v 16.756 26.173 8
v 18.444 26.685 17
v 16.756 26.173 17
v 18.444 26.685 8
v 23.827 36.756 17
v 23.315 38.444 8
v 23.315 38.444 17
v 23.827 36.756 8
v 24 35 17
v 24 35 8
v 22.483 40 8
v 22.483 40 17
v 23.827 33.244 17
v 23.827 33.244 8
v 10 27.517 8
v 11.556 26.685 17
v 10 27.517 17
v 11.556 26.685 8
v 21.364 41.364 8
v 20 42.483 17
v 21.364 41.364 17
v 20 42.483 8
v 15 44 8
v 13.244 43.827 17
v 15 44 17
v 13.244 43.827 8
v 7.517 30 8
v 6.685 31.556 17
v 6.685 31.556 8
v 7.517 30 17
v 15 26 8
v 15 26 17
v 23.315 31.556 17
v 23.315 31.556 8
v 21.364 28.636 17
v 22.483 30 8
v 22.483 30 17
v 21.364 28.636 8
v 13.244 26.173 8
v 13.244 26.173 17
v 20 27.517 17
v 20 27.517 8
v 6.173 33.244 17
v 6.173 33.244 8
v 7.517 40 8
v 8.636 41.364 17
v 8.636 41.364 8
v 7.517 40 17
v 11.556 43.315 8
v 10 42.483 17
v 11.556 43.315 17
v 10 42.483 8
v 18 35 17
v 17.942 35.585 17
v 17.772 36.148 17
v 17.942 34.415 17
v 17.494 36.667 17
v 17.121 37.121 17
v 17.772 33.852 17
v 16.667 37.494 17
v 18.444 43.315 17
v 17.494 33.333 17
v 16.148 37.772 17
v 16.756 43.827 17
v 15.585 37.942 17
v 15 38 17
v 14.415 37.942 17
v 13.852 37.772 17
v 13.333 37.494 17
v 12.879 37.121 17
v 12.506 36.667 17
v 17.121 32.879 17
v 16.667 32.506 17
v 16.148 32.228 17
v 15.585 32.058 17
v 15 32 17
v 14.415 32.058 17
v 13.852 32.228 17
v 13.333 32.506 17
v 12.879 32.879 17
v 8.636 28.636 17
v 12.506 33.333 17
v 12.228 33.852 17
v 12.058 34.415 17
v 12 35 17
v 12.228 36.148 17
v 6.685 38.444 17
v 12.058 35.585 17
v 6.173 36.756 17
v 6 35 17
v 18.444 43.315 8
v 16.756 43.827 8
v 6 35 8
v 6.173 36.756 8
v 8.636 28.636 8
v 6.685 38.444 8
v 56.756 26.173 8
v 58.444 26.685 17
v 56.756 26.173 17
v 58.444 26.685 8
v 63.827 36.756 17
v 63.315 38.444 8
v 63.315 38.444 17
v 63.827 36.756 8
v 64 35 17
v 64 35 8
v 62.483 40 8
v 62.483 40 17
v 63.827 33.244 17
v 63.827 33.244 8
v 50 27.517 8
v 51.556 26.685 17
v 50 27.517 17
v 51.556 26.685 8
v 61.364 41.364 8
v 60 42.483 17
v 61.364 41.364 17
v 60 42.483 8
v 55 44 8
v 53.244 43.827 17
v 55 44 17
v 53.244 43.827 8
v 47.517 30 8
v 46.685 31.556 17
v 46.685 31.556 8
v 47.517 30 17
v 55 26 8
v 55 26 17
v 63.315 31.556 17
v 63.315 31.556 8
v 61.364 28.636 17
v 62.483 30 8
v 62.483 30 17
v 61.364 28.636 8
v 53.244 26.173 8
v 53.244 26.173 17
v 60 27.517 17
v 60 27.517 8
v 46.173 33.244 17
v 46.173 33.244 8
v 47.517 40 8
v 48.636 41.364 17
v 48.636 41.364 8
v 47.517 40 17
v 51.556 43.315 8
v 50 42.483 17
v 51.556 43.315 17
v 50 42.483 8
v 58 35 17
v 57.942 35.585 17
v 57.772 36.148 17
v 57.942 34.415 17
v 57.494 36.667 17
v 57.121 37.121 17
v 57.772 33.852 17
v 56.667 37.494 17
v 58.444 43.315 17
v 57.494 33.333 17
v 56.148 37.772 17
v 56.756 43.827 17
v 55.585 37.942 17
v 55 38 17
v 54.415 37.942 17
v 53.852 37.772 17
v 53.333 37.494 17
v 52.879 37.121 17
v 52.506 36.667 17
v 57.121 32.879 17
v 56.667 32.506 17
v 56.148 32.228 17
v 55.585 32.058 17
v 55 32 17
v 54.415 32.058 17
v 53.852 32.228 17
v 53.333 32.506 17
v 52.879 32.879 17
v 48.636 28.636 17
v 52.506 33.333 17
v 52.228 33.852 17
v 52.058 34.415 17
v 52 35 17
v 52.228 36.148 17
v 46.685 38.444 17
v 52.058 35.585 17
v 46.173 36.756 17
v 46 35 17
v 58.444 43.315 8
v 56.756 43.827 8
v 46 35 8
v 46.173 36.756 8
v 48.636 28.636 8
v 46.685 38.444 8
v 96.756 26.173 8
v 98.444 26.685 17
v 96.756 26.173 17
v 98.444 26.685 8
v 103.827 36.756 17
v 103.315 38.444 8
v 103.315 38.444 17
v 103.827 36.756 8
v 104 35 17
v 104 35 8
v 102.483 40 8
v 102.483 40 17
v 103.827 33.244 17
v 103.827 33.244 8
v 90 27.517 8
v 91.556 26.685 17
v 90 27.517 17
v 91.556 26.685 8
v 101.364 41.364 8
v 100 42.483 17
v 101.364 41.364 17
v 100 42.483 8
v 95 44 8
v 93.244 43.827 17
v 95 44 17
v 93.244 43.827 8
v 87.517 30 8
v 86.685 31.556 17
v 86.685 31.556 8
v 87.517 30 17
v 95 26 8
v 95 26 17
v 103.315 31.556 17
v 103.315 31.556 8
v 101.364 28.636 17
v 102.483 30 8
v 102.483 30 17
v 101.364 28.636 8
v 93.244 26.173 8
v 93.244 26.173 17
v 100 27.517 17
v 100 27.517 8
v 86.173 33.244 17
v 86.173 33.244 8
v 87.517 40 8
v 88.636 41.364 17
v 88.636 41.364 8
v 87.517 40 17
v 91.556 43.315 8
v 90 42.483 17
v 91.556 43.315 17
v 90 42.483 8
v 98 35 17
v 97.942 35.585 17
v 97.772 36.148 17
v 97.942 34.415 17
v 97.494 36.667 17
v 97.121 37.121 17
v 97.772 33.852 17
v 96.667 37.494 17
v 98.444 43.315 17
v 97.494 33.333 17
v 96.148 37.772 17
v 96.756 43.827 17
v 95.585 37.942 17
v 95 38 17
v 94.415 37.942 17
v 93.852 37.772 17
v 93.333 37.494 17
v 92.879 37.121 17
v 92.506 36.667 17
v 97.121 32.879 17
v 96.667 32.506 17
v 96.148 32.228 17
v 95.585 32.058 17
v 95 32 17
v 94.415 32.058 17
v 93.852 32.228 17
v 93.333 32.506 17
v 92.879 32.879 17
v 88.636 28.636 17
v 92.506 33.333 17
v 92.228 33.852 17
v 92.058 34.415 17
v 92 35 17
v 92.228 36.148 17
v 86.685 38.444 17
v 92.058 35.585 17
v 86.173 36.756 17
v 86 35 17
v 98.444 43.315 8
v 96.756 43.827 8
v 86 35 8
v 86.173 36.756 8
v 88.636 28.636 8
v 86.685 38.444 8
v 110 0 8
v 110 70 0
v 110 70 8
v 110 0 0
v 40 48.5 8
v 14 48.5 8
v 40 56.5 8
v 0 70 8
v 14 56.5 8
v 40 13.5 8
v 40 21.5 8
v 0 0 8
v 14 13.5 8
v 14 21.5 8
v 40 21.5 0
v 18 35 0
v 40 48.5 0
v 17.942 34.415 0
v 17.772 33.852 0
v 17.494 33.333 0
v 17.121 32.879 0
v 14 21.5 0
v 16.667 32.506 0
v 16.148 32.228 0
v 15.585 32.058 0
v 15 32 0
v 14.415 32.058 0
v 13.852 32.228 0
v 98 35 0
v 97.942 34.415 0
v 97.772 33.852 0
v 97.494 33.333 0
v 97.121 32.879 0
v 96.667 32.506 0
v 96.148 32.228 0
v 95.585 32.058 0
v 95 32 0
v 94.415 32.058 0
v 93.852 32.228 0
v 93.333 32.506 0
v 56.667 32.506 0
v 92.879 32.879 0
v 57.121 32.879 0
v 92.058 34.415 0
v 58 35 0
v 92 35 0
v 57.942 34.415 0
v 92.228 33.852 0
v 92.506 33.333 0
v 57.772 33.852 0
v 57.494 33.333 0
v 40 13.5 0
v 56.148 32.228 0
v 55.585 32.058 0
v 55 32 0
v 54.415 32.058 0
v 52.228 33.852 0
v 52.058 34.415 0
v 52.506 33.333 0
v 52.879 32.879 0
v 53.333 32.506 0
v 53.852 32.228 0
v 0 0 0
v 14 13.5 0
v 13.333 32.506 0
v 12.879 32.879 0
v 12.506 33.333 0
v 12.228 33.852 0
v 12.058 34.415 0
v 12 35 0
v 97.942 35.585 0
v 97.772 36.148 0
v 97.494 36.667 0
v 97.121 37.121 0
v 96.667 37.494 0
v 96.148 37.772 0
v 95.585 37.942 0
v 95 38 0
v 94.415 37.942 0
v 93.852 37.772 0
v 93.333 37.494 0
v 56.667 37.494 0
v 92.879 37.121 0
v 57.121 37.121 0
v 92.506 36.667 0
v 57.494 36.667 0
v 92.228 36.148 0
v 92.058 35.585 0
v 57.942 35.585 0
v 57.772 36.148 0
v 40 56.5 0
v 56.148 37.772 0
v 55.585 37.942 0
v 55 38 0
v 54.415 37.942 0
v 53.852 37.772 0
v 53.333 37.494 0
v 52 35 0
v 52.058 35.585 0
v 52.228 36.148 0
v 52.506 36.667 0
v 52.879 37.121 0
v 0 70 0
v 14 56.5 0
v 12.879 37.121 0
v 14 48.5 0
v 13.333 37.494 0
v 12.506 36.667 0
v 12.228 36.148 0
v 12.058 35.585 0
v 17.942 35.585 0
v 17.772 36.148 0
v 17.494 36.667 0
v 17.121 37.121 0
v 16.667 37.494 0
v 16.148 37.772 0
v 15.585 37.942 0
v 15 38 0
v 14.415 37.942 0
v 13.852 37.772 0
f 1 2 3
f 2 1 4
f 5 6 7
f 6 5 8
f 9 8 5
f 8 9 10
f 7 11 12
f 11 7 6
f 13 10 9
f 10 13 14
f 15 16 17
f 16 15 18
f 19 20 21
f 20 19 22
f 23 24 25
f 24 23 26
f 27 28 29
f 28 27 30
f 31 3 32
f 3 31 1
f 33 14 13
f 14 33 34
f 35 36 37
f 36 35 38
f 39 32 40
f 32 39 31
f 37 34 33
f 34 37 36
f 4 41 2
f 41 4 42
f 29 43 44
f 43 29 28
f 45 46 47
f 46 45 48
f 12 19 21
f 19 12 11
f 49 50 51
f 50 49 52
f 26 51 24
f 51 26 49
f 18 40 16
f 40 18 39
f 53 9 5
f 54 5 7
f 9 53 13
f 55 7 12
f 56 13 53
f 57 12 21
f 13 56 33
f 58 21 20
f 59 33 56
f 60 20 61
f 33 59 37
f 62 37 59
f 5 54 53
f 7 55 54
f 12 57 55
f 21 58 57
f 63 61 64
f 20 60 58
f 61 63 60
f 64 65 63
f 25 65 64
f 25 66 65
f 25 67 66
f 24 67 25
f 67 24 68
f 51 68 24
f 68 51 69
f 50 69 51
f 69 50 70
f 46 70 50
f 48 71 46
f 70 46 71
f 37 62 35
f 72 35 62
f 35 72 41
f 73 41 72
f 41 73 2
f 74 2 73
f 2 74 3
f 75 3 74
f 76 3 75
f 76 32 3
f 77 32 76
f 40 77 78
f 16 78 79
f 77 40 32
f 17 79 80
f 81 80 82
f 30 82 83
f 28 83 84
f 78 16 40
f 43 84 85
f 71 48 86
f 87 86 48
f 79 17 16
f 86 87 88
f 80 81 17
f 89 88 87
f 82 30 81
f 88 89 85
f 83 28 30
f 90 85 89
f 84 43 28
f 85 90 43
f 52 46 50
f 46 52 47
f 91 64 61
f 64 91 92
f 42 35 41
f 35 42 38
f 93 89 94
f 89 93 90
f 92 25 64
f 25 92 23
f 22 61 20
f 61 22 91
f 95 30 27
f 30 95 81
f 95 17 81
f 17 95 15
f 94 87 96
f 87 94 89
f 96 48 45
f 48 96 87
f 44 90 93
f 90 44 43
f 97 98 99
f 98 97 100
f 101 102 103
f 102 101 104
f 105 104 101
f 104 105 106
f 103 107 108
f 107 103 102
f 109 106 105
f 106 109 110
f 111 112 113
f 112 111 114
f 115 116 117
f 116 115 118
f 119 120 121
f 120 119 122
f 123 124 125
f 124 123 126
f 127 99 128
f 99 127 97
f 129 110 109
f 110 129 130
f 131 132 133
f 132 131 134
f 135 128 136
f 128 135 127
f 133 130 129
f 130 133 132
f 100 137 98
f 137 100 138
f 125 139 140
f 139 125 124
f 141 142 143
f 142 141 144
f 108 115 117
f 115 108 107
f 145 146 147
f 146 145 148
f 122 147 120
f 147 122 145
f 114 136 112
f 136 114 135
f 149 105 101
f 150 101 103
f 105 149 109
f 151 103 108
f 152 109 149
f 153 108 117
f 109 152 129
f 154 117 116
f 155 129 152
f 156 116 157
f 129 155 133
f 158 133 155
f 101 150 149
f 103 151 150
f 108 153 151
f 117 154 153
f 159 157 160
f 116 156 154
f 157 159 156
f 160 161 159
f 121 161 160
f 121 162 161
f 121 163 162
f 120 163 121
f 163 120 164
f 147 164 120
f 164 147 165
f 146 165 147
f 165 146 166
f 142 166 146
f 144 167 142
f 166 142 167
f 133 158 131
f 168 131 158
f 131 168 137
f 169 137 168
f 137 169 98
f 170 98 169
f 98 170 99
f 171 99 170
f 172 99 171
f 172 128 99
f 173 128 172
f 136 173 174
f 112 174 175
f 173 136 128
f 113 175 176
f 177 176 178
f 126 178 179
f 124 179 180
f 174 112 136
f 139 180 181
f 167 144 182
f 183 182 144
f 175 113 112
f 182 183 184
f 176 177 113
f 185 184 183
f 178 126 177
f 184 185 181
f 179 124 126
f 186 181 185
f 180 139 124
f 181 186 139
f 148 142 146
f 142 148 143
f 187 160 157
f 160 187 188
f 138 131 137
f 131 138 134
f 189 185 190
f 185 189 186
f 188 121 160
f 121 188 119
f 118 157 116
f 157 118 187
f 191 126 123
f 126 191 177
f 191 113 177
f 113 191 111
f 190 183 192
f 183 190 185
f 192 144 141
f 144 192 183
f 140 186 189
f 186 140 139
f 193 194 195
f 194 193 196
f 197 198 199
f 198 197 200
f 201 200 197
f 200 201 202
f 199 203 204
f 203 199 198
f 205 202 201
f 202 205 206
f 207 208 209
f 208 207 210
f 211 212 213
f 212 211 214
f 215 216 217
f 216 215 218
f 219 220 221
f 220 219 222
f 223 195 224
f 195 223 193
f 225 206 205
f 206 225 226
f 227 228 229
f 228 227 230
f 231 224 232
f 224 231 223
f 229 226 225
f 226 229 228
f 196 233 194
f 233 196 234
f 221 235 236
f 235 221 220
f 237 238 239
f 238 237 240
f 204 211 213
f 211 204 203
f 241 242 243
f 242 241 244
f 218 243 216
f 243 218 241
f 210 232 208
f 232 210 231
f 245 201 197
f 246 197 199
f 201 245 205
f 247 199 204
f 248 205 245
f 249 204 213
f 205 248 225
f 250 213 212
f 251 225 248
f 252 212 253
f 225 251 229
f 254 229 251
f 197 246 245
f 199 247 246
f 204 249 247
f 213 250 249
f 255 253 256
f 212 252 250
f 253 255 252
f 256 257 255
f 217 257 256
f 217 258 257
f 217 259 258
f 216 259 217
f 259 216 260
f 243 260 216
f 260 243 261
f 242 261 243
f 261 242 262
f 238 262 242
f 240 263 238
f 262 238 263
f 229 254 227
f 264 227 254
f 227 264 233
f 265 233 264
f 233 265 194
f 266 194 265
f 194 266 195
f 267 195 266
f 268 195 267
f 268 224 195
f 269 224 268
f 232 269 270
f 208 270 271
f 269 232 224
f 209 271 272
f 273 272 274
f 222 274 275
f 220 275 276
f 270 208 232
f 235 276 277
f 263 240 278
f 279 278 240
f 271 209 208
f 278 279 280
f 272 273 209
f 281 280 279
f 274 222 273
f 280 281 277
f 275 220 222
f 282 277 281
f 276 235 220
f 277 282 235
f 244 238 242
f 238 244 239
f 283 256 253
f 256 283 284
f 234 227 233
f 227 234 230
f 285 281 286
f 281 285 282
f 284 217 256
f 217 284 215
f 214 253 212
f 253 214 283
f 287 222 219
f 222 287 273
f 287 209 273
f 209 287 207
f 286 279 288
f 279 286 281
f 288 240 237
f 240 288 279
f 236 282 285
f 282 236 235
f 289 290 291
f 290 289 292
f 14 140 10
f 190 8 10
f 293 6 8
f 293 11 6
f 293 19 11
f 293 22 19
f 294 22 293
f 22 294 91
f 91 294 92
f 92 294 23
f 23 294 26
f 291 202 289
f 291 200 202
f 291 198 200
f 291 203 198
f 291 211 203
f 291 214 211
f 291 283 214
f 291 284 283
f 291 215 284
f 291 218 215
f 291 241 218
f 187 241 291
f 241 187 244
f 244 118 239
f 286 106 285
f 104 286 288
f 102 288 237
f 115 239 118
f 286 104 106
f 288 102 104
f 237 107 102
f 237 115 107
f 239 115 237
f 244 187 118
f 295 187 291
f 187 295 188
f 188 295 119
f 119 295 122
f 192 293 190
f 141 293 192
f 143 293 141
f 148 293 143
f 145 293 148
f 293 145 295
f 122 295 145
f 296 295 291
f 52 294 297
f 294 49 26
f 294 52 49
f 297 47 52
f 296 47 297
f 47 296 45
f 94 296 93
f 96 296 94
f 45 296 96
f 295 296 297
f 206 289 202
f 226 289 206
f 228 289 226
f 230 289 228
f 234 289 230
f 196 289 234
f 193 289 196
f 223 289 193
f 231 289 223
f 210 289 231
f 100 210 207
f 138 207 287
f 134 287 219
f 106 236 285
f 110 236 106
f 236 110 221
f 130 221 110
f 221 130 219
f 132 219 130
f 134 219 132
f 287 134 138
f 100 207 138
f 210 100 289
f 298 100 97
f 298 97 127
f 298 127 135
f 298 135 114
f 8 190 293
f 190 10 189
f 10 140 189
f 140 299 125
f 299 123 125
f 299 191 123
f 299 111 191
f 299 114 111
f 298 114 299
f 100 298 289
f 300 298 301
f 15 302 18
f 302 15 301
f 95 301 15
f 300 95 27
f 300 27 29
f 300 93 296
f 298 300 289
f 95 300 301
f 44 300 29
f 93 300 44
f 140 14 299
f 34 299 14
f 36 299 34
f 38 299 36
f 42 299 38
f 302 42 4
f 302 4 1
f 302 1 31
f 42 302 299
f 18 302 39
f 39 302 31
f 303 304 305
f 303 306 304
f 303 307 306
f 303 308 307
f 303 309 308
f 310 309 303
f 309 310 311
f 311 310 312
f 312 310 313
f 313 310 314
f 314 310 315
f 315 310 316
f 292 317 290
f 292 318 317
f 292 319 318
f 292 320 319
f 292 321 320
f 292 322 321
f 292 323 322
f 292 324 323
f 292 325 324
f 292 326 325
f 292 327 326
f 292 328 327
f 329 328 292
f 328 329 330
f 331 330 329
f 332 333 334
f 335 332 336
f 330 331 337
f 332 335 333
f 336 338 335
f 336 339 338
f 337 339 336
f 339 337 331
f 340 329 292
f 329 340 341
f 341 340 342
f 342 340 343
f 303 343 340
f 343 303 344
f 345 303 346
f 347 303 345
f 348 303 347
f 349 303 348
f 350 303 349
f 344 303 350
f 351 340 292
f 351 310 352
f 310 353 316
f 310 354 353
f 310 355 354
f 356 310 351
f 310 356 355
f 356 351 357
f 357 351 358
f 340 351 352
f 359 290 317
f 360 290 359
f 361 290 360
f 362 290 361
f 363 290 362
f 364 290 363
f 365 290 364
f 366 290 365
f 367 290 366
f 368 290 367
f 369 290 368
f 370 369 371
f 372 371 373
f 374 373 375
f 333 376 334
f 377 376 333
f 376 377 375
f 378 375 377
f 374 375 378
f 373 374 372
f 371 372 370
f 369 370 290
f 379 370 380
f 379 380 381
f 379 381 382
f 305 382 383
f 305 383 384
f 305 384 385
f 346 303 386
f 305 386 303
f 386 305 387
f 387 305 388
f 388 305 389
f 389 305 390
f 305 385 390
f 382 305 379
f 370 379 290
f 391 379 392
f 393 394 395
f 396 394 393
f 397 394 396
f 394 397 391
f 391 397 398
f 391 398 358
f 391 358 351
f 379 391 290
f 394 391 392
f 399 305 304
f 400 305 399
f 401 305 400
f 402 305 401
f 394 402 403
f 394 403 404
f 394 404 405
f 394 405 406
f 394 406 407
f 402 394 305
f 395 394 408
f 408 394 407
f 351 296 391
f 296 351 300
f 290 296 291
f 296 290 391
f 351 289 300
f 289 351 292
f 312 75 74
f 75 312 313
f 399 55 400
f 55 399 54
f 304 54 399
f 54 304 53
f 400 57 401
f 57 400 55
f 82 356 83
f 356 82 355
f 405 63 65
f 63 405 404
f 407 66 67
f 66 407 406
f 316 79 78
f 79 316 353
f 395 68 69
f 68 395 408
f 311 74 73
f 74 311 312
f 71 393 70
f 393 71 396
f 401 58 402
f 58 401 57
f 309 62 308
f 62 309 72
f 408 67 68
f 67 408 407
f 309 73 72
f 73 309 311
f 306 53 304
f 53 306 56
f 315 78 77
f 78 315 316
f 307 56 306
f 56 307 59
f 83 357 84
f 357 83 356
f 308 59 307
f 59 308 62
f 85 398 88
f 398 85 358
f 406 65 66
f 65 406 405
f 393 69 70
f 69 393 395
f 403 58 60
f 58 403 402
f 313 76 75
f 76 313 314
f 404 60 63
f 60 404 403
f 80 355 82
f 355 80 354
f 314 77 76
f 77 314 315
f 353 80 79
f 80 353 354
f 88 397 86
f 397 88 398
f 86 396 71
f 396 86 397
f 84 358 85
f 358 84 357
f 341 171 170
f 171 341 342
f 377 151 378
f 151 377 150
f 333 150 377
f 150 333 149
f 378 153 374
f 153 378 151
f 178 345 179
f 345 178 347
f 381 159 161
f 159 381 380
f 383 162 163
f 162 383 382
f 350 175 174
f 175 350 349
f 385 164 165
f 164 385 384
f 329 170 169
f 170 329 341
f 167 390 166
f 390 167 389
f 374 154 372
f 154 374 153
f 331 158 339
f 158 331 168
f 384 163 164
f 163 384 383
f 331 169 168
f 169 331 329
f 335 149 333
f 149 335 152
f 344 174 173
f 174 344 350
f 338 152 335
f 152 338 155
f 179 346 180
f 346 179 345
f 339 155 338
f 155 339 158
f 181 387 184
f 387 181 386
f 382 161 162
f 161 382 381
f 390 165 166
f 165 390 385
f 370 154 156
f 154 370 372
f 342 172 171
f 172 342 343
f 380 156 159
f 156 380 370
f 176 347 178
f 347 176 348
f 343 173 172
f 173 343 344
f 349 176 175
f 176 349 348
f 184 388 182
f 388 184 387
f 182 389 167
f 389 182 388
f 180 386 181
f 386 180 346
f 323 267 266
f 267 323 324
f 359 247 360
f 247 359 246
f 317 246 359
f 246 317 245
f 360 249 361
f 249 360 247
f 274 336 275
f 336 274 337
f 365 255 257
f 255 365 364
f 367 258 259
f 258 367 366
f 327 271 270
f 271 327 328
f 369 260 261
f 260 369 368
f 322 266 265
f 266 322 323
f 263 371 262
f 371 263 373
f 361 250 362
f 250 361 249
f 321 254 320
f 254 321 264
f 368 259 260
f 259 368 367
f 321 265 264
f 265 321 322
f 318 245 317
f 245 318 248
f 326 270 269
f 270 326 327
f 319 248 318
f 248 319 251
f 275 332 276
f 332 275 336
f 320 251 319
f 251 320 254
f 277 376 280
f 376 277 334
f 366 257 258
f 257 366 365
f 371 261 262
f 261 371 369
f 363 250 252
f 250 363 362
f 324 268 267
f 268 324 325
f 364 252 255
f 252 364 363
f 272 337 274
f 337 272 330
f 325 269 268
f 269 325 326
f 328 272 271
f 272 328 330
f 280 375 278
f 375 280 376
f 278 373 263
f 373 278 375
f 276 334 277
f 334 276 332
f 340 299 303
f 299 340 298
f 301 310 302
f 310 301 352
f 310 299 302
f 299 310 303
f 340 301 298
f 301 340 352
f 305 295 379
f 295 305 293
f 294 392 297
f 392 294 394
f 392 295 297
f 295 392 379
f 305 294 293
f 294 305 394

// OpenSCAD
$fn = 32;

// ----------------------------------------------------------------------
// Drill jig: three_boss_slot jig
// ----------------------------------------------------------------------

// --- parameters (mm) ---
plate_l = 110;            // plate length, X
plate_w = 70;             // plate width, Y
plate_t = 8;              // plate thickness
boss_d = 18;              // guide boss diameter
boss_h = 10;              // boss height above the plate
guide_d = 6;              // guide hole diameter
boss_pitch = 40;          // boss pitch
slot_w = 8;               // clamp slot width
slot_l = 26;              // clamp slot length
slot_x = 14;              // slot start X

n_boss = 3;  // guide bosses
boss_x0 = (plate_l - (n_boss - 1) * boss_pitch) / 2;  // first boss X
boss_top = plate_t - 1 + boss_h;  // boss crown height
total_h = boss_top;  // overall height

difference() {
  union() {
  cube([plate_l, plate_w, plate_t]);
  for (i = [0 : n_boss - 1])
    translate([boss_x0 + i * boss_pitch, plate_w / 2, plate_t - 1])
      cylinder(h = boss_h, d = boss_d);
  }
  for (i = [0 : n_boss - 1])
    translate([boss_x0 + i * boss_pitch, plate_w / 2, -1])
      cylinder(h = plate_t + boss_h, d = guide_d);
  for (cy = [plate_w * 0.25, plate_w * 0.75])
    translate([slot_x, cy - slot_w / 2, -1])
      cube([slot_l, slot_w, plate_t + 2]);
}
